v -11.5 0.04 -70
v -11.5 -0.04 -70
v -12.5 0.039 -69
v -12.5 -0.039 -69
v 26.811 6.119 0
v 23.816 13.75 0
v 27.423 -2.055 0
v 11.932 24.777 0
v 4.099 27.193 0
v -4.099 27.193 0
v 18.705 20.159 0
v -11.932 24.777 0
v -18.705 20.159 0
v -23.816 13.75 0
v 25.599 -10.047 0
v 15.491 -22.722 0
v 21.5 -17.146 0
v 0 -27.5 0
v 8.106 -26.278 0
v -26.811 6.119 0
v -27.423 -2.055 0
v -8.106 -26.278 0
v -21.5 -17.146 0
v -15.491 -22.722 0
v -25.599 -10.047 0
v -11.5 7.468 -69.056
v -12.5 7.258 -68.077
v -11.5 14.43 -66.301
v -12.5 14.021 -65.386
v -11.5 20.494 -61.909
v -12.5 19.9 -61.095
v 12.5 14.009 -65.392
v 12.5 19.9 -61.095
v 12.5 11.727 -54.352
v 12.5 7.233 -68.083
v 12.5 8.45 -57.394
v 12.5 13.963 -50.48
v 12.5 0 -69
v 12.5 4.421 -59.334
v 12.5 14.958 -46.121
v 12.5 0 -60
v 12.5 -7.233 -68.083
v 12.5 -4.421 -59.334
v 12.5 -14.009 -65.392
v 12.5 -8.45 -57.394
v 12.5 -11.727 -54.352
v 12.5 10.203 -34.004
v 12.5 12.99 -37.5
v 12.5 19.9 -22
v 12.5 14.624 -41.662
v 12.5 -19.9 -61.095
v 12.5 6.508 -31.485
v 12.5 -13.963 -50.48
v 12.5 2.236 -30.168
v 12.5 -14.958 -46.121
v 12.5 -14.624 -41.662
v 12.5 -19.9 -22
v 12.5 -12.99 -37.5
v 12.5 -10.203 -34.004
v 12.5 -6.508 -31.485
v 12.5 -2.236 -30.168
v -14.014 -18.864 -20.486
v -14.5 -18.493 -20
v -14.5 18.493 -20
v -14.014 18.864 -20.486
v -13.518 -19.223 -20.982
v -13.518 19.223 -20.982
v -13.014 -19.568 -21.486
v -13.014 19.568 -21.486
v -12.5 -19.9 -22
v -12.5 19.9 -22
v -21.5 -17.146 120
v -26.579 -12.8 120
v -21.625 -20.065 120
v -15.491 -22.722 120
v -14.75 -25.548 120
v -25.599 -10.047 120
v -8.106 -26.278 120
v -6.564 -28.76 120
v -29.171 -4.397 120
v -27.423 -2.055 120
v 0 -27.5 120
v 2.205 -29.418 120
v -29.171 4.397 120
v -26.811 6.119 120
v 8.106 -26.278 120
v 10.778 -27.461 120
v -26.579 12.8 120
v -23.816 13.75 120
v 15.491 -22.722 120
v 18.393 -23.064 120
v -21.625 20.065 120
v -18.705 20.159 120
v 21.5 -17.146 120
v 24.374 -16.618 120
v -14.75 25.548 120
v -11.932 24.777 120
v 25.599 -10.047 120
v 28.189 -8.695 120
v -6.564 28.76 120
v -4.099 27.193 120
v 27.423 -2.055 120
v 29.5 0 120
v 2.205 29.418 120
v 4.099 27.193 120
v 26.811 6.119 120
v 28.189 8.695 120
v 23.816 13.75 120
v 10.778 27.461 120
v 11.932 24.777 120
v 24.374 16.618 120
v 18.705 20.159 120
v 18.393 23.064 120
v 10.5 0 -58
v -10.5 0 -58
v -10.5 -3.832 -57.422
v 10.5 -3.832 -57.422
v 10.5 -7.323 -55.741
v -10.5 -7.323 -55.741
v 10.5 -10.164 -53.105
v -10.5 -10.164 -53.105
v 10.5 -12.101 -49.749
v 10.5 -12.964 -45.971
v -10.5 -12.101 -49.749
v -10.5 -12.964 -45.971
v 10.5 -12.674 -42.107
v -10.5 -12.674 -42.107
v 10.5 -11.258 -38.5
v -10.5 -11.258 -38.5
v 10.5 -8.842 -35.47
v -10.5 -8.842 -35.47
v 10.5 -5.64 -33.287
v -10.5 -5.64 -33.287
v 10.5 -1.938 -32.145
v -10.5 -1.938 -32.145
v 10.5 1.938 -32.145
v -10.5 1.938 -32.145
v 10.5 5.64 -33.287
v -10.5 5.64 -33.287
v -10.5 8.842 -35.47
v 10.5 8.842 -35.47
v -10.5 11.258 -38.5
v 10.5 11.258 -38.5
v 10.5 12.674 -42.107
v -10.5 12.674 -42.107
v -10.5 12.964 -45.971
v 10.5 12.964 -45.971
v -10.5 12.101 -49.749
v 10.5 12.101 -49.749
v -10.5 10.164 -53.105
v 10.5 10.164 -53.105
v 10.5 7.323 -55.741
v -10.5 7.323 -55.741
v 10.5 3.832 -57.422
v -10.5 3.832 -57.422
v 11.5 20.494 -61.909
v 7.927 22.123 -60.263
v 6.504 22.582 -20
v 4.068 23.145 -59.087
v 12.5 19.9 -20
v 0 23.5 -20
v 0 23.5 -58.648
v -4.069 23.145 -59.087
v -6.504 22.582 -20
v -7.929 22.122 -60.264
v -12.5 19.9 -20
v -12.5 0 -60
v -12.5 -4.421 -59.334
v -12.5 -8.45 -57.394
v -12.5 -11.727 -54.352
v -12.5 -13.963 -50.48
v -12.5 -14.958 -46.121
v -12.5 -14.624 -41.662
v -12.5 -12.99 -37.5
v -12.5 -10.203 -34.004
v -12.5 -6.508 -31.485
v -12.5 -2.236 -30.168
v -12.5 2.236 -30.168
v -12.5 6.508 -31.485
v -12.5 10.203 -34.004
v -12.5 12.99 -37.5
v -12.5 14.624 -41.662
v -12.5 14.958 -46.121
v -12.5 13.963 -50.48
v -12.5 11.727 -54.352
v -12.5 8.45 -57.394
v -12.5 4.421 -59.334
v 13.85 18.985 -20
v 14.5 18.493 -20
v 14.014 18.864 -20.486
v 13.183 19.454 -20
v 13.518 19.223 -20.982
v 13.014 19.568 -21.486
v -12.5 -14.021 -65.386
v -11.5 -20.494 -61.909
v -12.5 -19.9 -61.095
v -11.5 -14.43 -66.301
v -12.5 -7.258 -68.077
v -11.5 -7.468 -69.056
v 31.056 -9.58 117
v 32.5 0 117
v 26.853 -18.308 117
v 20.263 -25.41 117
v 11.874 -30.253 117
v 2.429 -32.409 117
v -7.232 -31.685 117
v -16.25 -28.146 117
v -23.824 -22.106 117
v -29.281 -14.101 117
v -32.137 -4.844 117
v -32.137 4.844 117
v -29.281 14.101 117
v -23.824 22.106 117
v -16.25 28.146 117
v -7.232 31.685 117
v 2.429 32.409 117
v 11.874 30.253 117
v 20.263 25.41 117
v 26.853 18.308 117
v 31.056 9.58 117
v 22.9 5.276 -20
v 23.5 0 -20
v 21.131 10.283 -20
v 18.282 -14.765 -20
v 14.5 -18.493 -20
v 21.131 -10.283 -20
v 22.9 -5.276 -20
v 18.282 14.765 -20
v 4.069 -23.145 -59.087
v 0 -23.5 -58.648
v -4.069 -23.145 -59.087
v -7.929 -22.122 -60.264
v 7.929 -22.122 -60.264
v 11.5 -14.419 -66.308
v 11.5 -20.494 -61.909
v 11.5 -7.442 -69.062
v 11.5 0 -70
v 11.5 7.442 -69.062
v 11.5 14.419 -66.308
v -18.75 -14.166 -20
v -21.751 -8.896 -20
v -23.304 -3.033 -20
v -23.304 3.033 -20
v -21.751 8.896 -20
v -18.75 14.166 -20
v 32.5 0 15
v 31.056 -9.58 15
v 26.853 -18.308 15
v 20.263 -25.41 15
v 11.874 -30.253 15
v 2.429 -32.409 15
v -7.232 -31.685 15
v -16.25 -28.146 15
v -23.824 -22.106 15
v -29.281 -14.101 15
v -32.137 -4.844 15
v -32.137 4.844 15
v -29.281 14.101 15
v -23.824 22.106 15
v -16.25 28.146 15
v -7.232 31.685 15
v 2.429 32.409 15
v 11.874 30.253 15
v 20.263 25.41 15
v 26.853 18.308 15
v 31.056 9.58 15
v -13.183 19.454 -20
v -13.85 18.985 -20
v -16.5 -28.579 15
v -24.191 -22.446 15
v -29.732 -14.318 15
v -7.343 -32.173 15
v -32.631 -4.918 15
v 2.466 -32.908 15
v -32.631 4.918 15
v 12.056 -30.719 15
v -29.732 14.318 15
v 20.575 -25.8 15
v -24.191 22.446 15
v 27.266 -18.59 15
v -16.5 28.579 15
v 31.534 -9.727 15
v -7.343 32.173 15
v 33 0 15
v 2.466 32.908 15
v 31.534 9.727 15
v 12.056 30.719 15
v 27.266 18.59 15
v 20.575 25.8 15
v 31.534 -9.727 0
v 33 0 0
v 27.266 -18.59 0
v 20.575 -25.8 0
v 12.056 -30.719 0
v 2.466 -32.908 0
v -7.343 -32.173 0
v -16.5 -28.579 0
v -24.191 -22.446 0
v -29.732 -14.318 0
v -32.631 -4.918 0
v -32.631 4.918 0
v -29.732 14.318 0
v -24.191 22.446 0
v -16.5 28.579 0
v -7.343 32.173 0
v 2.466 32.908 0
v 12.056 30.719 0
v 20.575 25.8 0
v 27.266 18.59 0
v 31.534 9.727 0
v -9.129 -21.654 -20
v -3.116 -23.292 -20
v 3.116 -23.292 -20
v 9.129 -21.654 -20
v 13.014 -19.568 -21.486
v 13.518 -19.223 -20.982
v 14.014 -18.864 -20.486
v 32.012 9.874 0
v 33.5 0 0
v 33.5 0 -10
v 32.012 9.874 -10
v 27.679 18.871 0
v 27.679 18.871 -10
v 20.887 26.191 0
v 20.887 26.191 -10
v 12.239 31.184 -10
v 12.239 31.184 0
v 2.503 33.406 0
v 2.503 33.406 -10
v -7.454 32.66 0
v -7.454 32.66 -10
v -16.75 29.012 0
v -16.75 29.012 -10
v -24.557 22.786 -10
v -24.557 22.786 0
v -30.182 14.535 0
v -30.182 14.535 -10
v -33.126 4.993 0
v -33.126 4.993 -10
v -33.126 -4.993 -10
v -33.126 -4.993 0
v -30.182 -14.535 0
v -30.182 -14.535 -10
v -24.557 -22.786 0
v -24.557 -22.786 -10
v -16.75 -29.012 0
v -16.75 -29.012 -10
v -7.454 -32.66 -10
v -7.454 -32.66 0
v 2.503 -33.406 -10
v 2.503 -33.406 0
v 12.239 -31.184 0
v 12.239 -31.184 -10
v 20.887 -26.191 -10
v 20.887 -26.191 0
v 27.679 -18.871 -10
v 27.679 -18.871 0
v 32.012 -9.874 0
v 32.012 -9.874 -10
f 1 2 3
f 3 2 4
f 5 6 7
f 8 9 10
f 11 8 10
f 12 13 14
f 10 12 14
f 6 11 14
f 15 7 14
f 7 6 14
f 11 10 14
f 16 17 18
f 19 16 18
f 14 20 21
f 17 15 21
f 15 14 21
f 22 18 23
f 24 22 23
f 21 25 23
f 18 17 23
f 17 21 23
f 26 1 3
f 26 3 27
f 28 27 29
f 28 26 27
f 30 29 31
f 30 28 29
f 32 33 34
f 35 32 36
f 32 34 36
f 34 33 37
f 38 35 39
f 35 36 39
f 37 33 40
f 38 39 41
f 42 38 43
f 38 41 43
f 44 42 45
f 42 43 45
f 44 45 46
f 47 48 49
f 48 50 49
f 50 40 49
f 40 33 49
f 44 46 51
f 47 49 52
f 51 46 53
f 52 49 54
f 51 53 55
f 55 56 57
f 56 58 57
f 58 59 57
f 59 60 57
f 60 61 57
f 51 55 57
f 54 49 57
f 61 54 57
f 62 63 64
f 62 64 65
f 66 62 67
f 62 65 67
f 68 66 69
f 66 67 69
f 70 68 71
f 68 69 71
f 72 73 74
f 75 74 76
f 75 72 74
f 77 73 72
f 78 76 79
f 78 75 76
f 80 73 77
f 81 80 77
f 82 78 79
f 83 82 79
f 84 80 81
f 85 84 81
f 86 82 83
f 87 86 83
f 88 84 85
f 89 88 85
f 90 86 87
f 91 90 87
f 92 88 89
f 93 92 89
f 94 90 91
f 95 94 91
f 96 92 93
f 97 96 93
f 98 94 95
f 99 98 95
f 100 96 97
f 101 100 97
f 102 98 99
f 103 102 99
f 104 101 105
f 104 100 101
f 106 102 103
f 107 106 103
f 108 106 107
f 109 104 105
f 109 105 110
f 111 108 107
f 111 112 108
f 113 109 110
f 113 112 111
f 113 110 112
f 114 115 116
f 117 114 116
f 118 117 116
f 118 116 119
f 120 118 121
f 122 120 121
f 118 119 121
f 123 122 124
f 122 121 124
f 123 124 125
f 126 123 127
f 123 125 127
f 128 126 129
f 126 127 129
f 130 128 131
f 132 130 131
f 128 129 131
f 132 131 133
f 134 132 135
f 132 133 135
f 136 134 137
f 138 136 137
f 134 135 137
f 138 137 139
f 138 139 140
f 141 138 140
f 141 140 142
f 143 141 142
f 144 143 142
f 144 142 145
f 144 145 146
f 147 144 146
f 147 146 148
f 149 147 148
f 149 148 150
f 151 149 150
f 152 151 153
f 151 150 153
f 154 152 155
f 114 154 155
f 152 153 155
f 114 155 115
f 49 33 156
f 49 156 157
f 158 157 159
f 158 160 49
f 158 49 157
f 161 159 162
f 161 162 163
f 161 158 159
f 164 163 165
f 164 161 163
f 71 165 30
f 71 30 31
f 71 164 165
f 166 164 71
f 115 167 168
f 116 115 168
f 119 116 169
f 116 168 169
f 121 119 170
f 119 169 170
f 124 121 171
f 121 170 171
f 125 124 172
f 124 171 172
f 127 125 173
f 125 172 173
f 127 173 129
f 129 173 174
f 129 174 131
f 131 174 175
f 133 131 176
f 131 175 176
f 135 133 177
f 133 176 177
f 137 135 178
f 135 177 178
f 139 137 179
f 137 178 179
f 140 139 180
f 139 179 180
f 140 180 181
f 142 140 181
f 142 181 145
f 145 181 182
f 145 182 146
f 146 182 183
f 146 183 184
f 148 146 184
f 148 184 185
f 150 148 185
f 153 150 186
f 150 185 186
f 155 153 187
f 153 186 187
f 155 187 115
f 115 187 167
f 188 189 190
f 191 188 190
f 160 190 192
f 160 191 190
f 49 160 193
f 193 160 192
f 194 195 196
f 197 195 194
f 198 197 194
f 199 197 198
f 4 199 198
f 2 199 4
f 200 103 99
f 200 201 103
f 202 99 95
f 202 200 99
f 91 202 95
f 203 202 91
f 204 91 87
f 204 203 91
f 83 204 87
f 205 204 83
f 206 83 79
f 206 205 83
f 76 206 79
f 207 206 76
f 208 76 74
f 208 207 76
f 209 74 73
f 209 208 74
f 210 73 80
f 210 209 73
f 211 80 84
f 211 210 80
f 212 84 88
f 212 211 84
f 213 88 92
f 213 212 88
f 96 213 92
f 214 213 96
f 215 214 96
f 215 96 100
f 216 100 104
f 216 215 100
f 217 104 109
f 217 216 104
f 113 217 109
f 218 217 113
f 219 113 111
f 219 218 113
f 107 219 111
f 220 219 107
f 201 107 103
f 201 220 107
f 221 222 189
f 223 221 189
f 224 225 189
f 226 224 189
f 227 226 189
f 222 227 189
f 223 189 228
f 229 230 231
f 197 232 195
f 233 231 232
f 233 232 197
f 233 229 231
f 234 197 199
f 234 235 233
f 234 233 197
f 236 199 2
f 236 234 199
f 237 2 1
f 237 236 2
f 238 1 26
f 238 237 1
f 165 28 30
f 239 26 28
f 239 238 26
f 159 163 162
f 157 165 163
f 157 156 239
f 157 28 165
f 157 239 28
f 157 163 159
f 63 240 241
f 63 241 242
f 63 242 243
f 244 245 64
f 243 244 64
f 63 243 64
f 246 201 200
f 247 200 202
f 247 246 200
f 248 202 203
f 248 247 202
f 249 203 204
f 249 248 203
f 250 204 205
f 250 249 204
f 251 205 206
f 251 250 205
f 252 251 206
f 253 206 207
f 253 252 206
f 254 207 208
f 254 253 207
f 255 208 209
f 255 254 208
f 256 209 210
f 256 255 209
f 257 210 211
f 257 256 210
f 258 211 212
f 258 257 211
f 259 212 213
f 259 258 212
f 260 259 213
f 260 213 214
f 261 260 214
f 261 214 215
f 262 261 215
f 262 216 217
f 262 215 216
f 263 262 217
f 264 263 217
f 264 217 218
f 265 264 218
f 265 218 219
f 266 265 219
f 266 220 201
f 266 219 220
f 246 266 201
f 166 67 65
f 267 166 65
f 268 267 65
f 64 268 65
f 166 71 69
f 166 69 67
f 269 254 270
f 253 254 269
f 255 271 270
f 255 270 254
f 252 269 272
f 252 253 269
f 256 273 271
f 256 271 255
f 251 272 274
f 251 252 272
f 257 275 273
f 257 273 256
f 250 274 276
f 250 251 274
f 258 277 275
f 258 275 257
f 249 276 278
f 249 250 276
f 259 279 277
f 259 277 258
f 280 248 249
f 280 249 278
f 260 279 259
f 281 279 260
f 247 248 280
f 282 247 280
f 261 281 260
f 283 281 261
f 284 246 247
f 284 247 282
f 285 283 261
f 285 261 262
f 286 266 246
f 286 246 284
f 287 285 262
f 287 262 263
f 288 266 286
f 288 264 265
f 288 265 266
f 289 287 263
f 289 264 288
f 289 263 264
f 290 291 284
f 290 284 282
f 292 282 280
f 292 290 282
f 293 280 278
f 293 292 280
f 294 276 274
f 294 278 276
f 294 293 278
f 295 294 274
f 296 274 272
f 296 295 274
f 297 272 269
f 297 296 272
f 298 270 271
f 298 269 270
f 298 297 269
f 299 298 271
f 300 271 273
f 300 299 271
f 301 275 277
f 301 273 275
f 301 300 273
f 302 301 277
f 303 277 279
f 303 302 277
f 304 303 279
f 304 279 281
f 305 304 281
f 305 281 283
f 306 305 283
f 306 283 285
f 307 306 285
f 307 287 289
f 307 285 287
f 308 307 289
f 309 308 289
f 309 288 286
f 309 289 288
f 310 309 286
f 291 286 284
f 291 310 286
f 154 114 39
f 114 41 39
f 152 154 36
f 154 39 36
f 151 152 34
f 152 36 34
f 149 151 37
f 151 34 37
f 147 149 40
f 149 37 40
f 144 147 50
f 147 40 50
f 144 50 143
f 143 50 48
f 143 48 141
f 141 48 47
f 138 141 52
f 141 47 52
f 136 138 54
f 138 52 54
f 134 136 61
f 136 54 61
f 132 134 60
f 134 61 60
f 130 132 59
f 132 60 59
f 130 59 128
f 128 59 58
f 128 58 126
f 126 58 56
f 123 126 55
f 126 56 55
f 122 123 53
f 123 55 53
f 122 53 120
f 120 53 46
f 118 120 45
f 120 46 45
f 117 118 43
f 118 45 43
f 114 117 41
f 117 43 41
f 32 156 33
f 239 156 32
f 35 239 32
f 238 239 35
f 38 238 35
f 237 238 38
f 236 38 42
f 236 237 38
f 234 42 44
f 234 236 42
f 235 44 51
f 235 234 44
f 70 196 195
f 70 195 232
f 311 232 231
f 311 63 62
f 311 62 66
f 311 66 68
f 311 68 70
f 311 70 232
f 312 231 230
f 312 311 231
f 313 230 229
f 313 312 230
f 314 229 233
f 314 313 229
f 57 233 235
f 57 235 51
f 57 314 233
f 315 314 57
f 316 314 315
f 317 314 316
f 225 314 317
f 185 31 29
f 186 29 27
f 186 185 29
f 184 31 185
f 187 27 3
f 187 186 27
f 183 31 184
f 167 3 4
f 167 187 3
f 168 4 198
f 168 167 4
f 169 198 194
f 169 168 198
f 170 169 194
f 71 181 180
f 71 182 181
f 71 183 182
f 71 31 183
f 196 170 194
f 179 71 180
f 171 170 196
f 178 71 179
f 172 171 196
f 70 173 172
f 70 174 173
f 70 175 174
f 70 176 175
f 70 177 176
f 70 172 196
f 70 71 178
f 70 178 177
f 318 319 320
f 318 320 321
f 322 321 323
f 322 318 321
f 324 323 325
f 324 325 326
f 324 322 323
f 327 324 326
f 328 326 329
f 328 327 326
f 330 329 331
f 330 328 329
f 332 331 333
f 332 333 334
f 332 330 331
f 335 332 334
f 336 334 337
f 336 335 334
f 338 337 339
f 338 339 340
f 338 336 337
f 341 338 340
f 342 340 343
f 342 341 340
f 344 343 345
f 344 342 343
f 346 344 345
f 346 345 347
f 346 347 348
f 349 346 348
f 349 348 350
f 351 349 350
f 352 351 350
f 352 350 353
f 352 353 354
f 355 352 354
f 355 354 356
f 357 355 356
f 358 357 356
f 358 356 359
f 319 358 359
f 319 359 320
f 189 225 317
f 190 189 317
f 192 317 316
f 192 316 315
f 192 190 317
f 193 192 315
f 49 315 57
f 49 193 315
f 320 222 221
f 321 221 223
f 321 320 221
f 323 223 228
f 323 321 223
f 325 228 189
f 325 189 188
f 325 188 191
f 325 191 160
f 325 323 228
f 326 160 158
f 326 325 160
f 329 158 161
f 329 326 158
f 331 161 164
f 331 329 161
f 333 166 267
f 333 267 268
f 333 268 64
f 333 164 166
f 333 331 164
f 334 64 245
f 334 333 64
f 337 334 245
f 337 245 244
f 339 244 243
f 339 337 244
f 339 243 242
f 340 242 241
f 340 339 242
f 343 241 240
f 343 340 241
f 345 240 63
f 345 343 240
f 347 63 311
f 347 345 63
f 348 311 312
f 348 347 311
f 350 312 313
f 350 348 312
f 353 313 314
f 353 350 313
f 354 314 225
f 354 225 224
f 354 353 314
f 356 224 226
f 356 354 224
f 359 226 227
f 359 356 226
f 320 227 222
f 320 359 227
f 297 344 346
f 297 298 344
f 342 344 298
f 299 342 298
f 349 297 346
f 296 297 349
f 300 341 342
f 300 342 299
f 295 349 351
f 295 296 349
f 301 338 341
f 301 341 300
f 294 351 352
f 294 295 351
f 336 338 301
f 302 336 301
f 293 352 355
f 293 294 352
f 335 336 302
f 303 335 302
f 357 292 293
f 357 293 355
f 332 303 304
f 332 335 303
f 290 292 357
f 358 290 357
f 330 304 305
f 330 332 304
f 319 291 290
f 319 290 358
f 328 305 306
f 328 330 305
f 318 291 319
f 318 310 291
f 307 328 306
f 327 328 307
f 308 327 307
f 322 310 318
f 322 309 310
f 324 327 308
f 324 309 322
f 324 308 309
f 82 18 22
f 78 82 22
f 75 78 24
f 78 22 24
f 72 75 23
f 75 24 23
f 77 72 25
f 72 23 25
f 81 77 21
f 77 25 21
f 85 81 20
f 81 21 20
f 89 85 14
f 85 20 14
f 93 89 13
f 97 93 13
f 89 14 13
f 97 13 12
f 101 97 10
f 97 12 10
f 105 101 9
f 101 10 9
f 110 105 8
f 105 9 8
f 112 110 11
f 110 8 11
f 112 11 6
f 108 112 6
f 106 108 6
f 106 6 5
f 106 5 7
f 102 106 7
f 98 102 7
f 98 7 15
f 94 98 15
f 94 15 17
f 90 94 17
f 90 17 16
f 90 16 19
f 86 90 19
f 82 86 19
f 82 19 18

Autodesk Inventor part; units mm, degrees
ref_plane "YZ Plane" through (0, 0, 0) normal (1, 0, 0) x (0, 1, 0)
ref_plane "XZ Plane" through (0, 0, 0) normal (0, 1, 0) x (-1, 0, 0)
ref_plane "XY Plane" through (0, 0, 0) normal (0, 0, 1) x (1, 0, 0)
sketch "Sketch1" plane through (0, 0, 0) normal (0, 0, 1) x (1, 0, 0)
  circle A0 centre (0, 0) radius 33.5
  circle A1 centre (0, 0) radius 33
  circle A2 centre (0, 0) radius 32.5
  dimension "d0" = 67
  dimension "d1" = 66
  dimension "d6" = 65
extrude "Extrusion1" add sketch "Sketch1" against normal blind 20 contours A0 | A1 | A2
extrude "Extrusion2" add sketch "Sketch1" along normal blind 15 contours A1 | A2
extrude "Extrusion3" add sketch "Sketch1" along normal blind 120 contours A2
chamfer "Chamfer1" distance 10 angle 45 1 edges at (-33.5, 0, -20)
chamfer "Chamfer2" [suppressed]
sketch "Sketch2" plane through (0, 0, -20) normal (0, 0, -1) x (-1, 0, 0)
  circle A0 centre (0, 0) radius 23.5 projected
  line L0 (-12.5, 19.8997) -> (-12.5, -19.8997)
  line L1 (12.5, 19.8997) -> (12.5, -19.8997)
  dimension "d15" = 25
extrude "Extrusion4" add sketch "Sketch2" along normal blind 50 contours L1 A0 L0
sketch "Sketch3" plane through (12.5, -19.8997, -20) normal (1, 0, 0) x (0, 0, -1)
  line L0 (50, 39.7995) -> (50, 43.3997) construction
  line L1 (50, -3.6003) -> (50, 0) construction
  arc A0 (38.6481, -3.6003) -> (38.6481, 43.3997) centre (20, 19.8997) ccw
  line L2 (38.6481, 43.3997) -> (38.6481, -3.6003) construction
  line L3 (38.6481, 43.3997) -> (85.6481, 43.3997) construction
  line L4 (38.6481, 43.3997) -> (55.8157, 43.3997)
  line L5 (38.6481, -3.6003) -> (55.8157, -3.6003)
  line L6 (50, 39.7995) -> (50, 0) construction
  line L7 (55.8157, -3.6003) -> (55.8157, 43.3997)
  point P0 (-20, 19.8997)
  point P1 (62.1481, 43.3997)
  dimension "d19" = 90
  dimension "d48" = 30
extrude "Extrusion5" cut sketch "Sketch3" against normal through all
hole "Hole1" at (12.5, 0, -45) direction (-1, 0, 0) diameter 26 end through all
chamfer "Chamfer3" distance 2 angle 45 2 edges at (12.5, 0, -20) (-12.5, 0, -20)
hole "Hole2" at (0, 0, 120) direction (0, 0, -1) diameter 55 depth 120
chamfer "Chamfer4" distance 3 angle 45 1 edges at (-32.5, 0, 120)
chamfer "Chamfer5" distance 1 angle 45 2 edges at (-12.5, 0, -70) (12.5, 0, -70)
chamfer "Chamfer6" distance 2 angle 45 2 edges at (12.5, 0, -32) (-12.5, 0, -32)
properties part number "Base" material "Steel"
